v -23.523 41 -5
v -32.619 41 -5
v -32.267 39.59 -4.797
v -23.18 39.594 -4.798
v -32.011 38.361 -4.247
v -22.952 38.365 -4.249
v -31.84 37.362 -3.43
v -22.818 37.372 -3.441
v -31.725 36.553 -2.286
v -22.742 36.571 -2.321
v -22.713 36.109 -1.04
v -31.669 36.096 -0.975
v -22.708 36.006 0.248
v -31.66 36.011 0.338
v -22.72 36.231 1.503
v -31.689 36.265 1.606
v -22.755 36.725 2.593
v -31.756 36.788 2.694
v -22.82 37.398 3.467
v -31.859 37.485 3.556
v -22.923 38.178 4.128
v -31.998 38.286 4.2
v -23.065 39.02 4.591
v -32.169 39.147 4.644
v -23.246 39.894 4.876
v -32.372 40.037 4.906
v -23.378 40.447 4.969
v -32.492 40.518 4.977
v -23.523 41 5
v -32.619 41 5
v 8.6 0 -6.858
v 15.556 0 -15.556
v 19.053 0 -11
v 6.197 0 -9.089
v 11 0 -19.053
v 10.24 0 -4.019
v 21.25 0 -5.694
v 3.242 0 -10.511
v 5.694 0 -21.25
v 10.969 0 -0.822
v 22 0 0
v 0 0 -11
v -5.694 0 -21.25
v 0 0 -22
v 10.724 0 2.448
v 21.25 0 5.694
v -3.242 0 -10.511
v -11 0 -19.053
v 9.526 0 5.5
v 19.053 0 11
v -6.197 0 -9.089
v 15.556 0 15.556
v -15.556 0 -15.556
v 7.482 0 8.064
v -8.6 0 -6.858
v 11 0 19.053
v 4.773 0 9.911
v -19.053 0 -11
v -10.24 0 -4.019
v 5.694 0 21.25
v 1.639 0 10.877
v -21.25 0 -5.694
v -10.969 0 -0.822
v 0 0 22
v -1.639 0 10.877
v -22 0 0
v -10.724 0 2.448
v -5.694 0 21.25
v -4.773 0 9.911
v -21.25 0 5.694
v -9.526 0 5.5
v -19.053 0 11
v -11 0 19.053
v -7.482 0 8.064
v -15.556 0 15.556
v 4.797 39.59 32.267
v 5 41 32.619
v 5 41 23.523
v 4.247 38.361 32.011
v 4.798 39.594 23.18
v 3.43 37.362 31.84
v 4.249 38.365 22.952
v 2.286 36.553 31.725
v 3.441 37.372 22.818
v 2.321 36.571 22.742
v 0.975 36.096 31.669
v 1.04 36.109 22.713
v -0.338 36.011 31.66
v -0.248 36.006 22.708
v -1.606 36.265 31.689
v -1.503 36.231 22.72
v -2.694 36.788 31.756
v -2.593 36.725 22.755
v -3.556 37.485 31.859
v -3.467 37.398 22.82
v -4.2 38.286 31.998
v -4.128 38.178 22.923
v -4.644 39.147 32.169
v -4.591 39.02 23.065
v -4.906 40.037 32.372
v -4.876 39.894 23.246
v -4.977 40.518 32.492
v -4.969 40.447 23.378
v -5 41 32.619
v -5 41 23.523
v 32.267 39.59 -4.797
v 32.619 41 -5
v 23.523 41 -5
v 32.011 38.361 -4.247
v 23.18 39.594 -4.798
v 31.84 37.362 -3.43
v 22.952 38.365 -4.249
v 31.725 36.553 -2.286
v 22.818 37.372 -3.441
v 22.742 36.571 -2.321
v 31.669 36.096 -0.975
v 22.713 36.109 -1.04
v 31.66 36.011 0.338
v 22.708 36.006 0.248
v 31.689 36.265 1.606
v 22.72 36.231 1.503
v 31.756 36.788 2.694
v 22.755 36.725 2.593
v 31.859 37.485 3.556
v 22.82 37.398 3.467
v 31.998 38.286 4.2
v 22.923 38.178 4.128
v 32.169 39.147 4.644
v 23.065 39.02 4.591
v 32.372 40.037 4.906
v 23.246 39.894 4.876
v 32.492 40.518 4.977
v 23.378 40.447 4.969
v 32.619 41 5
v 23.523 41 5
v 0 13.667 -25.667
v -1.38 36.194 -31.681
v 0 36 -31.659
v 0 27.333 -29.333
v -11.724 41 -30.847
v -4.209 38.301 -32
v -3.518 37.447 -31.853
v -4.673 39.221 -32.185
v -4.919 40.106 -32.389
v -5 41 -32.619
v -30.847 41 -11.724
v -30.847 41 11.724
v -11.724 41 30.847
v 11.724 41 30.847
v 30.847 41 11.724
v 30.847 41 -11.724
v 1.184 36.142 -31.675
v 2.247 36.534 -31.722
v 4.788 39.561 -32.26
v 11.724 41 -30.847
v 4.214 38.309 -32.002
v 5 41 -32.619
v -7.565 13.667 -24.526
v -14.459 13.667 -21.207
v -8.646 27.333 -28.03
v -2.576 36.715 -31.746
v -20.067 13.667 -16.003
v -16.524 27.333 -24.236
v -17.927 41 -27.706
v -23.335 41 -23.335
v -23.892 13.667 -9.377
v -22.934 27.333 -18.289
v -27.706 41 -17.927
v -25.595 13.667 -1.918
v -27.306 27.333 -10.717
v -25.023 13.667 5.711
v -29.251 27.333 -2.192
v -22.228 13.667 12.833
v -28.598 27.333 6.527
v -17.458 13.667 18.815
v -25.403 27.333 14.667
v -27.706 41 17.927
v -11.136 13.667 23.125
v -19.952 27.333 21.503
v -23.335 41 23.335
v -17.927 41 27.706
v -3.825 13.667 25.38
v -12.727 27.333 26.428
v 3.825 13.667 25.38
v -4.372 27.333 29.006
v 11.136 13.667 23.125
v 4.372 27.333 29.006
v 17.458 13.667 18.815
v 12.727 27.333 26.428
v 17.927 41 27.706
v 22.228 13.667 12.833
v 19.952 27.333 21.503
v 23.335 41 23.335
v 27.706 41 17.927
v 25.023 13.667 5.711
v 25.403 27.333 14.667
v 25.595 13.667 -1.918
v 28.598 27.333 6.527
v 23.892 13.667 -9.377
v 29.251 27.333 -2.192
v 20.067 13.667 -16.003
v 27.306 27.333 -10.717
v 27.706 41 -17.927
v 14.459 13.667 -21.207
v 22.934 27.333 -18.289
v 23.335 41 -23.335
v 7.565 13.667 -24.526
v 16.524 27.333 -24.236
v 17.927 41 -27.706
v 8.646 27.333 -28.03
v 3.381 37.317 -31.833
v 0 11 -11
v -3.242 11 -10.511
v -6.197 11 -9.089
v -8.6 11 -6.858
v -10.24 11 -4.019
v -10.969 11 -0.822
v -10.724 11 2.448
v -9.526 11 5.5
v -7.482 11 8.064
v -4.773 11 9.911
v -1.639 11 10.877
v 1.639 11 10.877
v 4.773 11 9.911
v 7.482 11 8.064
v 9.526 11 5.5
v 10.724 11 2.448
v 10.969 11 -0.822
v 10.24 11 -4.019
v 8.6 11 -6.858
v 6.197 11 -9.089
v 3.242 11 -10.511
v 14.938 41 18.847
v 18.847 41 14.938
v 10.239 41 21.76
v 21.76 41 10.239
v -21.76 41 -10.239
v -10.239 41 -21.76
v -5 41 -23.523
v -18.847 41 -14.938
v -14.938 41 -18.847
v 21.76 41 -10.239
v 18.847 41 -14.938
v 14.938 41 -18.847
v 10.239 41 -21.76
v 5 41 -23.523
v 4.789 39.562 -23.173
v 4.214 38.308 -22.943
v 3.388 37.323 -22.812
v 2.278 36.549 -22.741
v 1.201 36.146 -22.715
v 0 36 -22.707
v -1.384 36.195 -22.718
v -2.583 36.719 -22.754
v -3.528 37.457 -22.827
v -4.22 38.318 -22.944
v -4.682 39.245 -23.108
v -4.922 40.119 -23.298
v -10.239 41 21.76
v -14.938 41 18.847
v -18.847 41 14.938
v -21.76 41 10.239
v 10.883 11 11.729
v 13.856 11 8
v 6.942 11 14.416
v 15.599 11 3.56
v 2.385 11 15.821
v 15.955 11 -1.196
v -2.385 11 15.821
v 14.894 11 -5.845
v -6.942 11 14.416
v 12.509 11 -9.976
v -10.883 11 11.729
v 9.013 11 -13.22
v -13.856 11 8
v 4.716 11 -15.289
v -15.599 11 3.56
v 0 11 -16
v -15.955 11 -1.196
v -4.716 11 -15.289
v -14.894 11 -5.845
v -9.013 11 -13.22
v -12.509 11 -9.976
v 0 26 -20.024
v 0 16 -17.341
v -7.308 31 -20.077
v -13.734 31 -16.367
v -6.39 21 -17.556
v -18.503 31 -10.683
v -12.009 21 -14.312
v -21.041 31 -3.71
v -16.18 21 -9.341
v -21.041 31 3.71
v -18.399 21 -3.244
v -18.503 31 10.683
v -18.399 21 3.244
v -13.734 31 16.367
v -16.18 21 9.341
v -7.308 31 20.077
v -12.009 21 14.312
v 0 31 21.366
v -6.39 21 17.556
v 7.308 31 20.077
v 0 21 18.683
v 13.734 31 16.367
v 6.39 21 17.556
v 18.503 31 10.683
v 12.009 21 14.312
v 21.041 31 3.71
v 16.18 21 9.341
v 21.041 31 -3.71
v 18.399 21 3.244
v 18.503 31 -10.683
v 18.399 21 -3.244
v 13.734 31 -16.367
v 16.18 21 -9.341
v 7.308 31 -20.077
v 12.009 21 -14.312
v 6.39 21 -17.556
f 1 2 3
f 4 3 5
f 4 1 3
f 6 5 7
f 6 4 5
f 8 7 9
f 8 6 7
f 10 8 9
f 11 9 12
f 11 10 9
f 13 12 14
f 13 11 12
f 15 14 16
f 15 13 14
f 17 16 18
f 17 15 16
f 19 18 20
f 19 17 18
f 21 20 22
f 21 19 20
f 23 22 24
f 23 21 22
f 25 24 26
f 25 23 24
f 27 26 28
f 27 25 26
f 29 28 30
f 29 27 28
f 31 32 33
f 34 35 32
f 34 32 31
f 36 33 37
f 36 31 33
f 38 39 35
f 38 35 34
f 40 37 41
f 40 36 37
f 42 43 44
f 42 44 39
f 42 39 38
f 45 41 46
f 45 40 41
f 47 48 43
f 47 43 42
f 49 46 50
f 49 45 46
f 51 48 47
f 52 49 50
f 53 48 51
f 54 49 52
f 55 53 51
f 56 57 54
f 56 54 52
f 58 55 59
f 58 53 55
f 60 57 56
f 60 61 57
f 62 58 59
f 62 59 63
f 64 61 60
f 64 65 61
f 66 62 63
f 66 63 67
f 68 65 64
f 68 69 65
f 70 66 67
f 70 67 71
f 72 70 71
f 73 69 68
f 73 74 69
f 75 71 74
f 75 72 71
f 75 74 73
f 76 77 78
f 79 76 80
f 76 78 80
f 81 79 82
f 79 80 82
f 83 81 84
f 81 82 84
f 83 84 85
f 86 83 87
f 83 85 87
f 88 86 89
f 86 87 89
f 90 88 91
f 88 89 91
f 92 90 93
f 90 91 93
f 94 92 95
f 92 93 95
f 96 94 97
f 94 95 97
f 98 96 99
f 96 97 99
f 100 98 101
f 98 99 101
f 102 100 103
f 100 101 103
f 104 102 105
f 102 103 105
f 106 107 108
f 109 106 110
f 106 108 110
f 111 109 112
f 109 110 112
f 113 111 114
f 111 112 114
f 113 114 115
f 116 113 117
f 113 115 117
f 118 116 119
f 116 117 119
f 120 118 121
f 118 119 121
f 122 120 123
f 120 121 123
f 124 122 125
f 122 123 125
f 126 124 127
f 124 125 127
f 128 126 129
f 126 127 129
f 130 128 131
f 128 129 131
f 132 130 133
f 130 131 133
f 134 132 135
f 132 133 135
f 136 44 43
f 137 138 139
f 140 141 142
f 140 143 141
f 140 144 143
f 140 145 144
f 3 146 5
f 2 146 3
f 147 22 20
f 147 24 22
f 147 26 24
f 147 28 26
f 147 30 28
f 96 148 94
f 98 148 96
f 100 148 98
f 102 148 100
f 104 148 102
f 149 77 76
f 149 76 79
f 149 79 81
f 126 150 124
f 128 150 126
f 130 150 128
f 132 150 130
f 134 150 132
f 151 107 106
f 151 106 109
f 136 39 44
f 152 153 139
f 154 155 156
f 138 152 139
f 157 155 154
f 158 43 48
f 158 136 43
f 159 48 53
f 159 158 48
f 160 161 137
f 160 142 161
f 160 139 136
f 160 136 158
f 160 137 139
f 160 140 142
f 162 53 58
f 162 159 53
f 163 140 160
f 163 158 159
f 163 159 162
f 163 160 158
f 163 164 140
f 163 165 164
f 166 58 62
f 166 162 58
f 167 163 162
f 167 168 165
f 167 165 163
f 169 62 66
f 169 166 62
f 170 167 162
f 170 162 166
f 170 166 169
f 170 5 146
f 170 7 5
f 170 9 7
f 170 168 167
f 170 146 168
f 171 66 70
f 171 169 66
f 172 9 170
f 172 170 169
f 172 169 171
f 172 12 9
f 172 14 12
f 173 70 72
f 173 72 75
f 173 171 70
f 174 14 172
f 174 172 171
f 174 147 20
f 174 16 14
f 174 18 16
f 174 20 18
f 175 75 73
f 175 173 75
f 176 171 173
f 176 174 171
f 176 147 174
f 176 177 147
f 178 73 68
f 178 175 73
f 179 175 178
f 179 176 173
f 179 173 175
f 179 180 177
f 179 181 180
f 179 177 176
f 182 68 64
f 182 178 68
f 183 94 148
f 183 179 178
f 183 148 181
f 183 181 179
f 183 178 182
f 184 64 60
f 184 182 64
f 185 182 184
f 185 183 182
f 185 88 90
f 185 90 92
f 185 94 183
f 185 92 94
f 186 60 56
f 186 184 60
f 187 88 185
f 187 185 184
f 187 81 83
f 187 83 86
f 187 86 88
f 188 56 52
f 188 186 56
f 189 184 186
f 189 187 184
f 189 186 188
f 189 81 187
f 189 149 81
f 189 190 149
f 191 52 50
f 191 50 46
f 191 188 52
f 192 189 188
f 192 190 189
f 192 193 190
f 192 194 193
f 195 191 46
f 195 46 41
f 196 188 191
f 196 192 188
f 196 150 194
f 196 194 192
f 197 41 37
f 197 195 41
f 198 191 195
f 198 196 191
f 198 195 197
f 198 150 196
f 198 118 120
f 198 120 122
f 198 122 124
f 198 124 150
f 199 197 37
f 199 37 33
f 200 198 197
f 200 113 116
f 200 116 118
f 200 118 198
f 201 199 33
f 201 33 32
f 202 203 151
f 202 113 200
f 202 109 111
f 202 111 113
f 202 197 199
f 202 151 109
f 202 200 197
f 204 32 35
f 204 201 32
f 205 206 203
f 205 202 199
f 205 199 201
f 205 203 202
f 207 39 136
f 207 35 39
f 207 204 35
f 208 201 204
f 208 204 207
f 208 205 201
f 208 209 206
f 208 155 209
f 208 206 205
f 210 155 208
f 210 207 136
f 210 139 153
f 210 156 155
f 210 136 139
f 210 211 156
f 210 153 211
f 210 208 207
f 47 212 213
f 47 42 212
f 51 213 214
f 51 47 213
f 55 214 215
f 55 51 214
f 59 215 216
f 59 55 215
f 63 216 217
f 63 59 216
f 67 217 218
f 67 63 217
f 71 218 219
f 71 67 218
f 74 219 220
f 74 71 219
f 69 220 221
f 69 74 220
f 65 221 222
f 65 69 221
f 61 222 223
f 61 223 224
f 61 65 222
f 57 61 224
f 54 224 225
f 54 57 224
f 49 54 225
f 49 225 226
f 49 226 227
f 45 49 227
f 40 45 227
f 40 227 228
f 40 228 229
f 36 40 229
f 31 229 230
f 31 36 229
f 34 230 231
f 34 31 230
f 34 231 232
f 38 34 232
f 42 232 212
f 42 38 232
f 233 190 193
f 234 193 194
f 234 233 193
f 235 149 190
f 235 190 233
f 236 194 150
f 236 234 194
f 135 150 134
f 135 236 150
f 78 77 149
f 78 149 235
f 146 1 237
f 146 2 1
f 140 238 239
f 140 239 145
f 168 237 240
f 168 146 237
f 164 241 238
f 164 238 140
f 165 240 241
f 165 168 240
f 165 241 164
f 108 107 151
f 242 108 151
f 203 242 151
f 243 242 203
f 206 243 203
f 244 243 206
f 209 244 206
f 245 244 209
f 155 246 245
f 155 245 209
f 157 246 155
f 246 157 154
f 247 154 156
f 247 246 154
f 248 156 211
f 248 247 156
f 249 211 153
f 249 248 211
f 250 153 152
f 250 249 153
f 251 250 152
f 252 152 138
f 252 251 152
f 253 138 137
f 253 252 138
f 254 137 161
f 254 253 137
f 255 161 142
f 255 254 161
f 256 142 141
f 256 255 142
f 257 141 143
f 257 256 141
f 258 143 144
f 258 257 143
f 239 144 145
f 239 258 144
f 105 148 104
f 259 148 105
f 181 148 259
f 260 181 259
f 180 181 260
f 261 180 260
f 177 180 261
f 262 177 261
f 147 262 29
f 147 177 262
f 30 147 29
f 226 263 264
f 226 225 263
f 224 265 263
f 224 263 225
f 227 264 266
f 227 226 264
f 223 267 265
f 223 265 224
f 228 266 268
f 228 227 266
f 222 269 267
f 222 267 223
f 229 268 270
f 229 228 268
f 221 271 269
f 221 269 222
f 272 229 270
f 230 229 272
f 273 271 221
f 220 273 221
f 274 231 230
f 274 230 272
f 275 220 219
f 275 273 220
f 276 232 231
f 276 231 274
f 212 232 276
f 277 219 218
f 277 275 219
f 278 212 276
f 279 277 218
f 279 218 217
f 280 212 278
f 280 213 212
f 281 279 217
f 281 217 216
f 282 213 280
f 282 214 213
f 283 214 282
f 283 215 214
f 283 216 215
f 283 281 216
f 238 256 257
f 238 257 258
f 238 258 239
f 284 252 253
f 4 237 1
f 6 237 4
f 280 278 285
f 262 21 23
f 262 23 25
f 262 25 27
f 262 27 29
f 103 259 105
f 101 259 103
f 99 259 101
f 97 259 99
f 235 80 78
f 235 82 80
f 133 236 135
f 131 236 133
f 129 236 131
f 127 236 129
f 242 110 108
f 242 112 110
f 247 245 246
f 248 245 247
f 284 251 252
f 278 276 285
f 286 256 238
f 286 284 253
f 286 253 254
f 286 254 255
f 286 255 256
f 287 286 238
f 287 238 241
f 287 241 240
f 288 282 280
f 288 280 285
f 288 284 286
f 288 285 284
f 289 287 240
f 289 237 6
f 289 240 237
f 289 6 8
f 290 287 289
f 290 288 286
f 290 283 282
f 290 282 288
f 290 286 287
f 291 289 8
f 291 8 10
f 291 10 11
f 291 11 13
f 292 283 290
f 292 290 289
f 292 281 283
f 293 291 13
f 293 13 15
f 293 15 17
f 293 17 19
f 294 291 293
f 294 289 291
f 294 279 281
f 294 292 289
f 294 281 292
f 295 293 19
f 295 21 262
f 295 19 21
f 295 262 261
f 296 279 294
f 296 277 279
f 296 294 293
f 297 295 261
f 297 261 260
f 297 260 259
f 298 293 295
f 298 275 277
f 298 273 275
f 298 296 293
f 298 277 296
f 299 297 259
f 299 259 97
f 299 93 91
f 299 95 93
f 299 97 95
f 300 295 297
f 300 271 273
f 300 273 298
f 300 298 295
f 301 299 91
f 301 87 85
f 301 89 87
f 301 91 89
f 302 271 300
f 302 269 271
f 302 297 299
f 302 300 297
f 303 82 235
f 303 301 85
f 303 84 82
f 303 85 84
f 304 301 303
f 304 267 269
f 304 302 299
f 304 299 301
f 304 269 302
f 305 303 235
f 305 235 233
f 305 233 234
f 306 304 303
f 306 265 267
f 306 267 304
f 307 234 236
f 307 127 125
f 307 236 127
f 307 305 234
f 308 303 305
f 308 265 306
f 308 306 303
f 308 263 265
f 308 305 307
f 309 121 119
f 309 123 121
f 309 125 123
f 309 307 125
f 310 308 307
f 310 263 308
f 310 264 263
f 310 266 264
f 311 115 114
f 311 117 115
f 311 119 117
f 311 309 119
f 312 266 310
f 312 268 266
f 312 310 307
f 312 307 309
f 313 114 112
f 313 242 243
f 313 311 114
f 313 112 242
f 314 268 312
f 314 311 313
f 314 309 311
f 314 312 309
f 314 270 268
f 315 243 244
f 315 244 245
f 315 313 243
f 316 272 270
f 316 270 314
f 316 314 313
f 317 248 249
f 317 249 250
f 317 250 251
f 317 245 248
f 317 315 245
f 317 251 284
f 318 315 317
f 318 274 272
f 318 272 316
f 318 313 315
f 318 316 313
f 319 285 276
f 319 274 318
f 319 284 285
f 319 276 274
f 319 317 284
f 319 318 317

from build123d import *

# Parameters (mm, degrees)
CUT_EXTRUDE1_DEPTH      = 34
CUT_EXTRUDE1_DEPTH_BACK = 34
CUT_EXTRUDE2_DEPTH      = 34.0000001
CUT_EXTRUDE2_DEPTH_BACK = 34.0000001


with BuildPart() as part:
    # Sketch1 → Revolve1 (revolve)
    with BuildSketch(Plane.XY, mode=Mode.PRIVATE) as revolve1_sk:
        Polygon((-11, 0), (-22, 0), (-33, 41), (-24.048780488, 41), (-16, 11), (-11, 11), align=None)
    revolve(revolve1_sk.sketch.rotate(Axis((0, 0, 0), (0, 1, 0)), 270), axis=Axis((0, 0, 0), (0, 1, 0)))  # turned: the seam where the file's is

    # Sketch2 → Cut-Extrude1 (cut, two sides)
    with BuildSketch(Plane.XY) as cut_extrude1_sk:
        with BuildLine():
            Line((-5, 41), (5, 41))
            ThreePointArc((5, 41), (0, 36), (-5, 41))
        make_face()
    extrude(amount=CUT_EXTRUDE1_DEPTH, mode=Mode.SUBTRACT)
    extrude(cut_extrude1_sk.sketch, amount=-CUT_EXTRUDE1_DEPTH_BACK, mode=Mode.SUBTRACT)

    # Sketch3 → Cut-Extrude2 (cut, two sides)
    with BuildSketch(Plane(origin=(0, 0, 0), x_dir=(0, 0, -1), z_dir=(1, 0, 0))) as cut_extrude2_sk:
        with BuildLine():
            Line((-5, 41), (5, 41))
            ThreePointArc((5, 41), (0, 36), (-5, 41))
        make_face()
    extrude(amount=CUT_EXTRUDE2_DEPTH, mode=Mode.SUBTRACT)
    extrude(cut_extrude2_sk.sketch, amount=-CUT_EXTRUDE2_DEPTH_BACK, mode=Mode.SUBTRACT)


solid = part.part
